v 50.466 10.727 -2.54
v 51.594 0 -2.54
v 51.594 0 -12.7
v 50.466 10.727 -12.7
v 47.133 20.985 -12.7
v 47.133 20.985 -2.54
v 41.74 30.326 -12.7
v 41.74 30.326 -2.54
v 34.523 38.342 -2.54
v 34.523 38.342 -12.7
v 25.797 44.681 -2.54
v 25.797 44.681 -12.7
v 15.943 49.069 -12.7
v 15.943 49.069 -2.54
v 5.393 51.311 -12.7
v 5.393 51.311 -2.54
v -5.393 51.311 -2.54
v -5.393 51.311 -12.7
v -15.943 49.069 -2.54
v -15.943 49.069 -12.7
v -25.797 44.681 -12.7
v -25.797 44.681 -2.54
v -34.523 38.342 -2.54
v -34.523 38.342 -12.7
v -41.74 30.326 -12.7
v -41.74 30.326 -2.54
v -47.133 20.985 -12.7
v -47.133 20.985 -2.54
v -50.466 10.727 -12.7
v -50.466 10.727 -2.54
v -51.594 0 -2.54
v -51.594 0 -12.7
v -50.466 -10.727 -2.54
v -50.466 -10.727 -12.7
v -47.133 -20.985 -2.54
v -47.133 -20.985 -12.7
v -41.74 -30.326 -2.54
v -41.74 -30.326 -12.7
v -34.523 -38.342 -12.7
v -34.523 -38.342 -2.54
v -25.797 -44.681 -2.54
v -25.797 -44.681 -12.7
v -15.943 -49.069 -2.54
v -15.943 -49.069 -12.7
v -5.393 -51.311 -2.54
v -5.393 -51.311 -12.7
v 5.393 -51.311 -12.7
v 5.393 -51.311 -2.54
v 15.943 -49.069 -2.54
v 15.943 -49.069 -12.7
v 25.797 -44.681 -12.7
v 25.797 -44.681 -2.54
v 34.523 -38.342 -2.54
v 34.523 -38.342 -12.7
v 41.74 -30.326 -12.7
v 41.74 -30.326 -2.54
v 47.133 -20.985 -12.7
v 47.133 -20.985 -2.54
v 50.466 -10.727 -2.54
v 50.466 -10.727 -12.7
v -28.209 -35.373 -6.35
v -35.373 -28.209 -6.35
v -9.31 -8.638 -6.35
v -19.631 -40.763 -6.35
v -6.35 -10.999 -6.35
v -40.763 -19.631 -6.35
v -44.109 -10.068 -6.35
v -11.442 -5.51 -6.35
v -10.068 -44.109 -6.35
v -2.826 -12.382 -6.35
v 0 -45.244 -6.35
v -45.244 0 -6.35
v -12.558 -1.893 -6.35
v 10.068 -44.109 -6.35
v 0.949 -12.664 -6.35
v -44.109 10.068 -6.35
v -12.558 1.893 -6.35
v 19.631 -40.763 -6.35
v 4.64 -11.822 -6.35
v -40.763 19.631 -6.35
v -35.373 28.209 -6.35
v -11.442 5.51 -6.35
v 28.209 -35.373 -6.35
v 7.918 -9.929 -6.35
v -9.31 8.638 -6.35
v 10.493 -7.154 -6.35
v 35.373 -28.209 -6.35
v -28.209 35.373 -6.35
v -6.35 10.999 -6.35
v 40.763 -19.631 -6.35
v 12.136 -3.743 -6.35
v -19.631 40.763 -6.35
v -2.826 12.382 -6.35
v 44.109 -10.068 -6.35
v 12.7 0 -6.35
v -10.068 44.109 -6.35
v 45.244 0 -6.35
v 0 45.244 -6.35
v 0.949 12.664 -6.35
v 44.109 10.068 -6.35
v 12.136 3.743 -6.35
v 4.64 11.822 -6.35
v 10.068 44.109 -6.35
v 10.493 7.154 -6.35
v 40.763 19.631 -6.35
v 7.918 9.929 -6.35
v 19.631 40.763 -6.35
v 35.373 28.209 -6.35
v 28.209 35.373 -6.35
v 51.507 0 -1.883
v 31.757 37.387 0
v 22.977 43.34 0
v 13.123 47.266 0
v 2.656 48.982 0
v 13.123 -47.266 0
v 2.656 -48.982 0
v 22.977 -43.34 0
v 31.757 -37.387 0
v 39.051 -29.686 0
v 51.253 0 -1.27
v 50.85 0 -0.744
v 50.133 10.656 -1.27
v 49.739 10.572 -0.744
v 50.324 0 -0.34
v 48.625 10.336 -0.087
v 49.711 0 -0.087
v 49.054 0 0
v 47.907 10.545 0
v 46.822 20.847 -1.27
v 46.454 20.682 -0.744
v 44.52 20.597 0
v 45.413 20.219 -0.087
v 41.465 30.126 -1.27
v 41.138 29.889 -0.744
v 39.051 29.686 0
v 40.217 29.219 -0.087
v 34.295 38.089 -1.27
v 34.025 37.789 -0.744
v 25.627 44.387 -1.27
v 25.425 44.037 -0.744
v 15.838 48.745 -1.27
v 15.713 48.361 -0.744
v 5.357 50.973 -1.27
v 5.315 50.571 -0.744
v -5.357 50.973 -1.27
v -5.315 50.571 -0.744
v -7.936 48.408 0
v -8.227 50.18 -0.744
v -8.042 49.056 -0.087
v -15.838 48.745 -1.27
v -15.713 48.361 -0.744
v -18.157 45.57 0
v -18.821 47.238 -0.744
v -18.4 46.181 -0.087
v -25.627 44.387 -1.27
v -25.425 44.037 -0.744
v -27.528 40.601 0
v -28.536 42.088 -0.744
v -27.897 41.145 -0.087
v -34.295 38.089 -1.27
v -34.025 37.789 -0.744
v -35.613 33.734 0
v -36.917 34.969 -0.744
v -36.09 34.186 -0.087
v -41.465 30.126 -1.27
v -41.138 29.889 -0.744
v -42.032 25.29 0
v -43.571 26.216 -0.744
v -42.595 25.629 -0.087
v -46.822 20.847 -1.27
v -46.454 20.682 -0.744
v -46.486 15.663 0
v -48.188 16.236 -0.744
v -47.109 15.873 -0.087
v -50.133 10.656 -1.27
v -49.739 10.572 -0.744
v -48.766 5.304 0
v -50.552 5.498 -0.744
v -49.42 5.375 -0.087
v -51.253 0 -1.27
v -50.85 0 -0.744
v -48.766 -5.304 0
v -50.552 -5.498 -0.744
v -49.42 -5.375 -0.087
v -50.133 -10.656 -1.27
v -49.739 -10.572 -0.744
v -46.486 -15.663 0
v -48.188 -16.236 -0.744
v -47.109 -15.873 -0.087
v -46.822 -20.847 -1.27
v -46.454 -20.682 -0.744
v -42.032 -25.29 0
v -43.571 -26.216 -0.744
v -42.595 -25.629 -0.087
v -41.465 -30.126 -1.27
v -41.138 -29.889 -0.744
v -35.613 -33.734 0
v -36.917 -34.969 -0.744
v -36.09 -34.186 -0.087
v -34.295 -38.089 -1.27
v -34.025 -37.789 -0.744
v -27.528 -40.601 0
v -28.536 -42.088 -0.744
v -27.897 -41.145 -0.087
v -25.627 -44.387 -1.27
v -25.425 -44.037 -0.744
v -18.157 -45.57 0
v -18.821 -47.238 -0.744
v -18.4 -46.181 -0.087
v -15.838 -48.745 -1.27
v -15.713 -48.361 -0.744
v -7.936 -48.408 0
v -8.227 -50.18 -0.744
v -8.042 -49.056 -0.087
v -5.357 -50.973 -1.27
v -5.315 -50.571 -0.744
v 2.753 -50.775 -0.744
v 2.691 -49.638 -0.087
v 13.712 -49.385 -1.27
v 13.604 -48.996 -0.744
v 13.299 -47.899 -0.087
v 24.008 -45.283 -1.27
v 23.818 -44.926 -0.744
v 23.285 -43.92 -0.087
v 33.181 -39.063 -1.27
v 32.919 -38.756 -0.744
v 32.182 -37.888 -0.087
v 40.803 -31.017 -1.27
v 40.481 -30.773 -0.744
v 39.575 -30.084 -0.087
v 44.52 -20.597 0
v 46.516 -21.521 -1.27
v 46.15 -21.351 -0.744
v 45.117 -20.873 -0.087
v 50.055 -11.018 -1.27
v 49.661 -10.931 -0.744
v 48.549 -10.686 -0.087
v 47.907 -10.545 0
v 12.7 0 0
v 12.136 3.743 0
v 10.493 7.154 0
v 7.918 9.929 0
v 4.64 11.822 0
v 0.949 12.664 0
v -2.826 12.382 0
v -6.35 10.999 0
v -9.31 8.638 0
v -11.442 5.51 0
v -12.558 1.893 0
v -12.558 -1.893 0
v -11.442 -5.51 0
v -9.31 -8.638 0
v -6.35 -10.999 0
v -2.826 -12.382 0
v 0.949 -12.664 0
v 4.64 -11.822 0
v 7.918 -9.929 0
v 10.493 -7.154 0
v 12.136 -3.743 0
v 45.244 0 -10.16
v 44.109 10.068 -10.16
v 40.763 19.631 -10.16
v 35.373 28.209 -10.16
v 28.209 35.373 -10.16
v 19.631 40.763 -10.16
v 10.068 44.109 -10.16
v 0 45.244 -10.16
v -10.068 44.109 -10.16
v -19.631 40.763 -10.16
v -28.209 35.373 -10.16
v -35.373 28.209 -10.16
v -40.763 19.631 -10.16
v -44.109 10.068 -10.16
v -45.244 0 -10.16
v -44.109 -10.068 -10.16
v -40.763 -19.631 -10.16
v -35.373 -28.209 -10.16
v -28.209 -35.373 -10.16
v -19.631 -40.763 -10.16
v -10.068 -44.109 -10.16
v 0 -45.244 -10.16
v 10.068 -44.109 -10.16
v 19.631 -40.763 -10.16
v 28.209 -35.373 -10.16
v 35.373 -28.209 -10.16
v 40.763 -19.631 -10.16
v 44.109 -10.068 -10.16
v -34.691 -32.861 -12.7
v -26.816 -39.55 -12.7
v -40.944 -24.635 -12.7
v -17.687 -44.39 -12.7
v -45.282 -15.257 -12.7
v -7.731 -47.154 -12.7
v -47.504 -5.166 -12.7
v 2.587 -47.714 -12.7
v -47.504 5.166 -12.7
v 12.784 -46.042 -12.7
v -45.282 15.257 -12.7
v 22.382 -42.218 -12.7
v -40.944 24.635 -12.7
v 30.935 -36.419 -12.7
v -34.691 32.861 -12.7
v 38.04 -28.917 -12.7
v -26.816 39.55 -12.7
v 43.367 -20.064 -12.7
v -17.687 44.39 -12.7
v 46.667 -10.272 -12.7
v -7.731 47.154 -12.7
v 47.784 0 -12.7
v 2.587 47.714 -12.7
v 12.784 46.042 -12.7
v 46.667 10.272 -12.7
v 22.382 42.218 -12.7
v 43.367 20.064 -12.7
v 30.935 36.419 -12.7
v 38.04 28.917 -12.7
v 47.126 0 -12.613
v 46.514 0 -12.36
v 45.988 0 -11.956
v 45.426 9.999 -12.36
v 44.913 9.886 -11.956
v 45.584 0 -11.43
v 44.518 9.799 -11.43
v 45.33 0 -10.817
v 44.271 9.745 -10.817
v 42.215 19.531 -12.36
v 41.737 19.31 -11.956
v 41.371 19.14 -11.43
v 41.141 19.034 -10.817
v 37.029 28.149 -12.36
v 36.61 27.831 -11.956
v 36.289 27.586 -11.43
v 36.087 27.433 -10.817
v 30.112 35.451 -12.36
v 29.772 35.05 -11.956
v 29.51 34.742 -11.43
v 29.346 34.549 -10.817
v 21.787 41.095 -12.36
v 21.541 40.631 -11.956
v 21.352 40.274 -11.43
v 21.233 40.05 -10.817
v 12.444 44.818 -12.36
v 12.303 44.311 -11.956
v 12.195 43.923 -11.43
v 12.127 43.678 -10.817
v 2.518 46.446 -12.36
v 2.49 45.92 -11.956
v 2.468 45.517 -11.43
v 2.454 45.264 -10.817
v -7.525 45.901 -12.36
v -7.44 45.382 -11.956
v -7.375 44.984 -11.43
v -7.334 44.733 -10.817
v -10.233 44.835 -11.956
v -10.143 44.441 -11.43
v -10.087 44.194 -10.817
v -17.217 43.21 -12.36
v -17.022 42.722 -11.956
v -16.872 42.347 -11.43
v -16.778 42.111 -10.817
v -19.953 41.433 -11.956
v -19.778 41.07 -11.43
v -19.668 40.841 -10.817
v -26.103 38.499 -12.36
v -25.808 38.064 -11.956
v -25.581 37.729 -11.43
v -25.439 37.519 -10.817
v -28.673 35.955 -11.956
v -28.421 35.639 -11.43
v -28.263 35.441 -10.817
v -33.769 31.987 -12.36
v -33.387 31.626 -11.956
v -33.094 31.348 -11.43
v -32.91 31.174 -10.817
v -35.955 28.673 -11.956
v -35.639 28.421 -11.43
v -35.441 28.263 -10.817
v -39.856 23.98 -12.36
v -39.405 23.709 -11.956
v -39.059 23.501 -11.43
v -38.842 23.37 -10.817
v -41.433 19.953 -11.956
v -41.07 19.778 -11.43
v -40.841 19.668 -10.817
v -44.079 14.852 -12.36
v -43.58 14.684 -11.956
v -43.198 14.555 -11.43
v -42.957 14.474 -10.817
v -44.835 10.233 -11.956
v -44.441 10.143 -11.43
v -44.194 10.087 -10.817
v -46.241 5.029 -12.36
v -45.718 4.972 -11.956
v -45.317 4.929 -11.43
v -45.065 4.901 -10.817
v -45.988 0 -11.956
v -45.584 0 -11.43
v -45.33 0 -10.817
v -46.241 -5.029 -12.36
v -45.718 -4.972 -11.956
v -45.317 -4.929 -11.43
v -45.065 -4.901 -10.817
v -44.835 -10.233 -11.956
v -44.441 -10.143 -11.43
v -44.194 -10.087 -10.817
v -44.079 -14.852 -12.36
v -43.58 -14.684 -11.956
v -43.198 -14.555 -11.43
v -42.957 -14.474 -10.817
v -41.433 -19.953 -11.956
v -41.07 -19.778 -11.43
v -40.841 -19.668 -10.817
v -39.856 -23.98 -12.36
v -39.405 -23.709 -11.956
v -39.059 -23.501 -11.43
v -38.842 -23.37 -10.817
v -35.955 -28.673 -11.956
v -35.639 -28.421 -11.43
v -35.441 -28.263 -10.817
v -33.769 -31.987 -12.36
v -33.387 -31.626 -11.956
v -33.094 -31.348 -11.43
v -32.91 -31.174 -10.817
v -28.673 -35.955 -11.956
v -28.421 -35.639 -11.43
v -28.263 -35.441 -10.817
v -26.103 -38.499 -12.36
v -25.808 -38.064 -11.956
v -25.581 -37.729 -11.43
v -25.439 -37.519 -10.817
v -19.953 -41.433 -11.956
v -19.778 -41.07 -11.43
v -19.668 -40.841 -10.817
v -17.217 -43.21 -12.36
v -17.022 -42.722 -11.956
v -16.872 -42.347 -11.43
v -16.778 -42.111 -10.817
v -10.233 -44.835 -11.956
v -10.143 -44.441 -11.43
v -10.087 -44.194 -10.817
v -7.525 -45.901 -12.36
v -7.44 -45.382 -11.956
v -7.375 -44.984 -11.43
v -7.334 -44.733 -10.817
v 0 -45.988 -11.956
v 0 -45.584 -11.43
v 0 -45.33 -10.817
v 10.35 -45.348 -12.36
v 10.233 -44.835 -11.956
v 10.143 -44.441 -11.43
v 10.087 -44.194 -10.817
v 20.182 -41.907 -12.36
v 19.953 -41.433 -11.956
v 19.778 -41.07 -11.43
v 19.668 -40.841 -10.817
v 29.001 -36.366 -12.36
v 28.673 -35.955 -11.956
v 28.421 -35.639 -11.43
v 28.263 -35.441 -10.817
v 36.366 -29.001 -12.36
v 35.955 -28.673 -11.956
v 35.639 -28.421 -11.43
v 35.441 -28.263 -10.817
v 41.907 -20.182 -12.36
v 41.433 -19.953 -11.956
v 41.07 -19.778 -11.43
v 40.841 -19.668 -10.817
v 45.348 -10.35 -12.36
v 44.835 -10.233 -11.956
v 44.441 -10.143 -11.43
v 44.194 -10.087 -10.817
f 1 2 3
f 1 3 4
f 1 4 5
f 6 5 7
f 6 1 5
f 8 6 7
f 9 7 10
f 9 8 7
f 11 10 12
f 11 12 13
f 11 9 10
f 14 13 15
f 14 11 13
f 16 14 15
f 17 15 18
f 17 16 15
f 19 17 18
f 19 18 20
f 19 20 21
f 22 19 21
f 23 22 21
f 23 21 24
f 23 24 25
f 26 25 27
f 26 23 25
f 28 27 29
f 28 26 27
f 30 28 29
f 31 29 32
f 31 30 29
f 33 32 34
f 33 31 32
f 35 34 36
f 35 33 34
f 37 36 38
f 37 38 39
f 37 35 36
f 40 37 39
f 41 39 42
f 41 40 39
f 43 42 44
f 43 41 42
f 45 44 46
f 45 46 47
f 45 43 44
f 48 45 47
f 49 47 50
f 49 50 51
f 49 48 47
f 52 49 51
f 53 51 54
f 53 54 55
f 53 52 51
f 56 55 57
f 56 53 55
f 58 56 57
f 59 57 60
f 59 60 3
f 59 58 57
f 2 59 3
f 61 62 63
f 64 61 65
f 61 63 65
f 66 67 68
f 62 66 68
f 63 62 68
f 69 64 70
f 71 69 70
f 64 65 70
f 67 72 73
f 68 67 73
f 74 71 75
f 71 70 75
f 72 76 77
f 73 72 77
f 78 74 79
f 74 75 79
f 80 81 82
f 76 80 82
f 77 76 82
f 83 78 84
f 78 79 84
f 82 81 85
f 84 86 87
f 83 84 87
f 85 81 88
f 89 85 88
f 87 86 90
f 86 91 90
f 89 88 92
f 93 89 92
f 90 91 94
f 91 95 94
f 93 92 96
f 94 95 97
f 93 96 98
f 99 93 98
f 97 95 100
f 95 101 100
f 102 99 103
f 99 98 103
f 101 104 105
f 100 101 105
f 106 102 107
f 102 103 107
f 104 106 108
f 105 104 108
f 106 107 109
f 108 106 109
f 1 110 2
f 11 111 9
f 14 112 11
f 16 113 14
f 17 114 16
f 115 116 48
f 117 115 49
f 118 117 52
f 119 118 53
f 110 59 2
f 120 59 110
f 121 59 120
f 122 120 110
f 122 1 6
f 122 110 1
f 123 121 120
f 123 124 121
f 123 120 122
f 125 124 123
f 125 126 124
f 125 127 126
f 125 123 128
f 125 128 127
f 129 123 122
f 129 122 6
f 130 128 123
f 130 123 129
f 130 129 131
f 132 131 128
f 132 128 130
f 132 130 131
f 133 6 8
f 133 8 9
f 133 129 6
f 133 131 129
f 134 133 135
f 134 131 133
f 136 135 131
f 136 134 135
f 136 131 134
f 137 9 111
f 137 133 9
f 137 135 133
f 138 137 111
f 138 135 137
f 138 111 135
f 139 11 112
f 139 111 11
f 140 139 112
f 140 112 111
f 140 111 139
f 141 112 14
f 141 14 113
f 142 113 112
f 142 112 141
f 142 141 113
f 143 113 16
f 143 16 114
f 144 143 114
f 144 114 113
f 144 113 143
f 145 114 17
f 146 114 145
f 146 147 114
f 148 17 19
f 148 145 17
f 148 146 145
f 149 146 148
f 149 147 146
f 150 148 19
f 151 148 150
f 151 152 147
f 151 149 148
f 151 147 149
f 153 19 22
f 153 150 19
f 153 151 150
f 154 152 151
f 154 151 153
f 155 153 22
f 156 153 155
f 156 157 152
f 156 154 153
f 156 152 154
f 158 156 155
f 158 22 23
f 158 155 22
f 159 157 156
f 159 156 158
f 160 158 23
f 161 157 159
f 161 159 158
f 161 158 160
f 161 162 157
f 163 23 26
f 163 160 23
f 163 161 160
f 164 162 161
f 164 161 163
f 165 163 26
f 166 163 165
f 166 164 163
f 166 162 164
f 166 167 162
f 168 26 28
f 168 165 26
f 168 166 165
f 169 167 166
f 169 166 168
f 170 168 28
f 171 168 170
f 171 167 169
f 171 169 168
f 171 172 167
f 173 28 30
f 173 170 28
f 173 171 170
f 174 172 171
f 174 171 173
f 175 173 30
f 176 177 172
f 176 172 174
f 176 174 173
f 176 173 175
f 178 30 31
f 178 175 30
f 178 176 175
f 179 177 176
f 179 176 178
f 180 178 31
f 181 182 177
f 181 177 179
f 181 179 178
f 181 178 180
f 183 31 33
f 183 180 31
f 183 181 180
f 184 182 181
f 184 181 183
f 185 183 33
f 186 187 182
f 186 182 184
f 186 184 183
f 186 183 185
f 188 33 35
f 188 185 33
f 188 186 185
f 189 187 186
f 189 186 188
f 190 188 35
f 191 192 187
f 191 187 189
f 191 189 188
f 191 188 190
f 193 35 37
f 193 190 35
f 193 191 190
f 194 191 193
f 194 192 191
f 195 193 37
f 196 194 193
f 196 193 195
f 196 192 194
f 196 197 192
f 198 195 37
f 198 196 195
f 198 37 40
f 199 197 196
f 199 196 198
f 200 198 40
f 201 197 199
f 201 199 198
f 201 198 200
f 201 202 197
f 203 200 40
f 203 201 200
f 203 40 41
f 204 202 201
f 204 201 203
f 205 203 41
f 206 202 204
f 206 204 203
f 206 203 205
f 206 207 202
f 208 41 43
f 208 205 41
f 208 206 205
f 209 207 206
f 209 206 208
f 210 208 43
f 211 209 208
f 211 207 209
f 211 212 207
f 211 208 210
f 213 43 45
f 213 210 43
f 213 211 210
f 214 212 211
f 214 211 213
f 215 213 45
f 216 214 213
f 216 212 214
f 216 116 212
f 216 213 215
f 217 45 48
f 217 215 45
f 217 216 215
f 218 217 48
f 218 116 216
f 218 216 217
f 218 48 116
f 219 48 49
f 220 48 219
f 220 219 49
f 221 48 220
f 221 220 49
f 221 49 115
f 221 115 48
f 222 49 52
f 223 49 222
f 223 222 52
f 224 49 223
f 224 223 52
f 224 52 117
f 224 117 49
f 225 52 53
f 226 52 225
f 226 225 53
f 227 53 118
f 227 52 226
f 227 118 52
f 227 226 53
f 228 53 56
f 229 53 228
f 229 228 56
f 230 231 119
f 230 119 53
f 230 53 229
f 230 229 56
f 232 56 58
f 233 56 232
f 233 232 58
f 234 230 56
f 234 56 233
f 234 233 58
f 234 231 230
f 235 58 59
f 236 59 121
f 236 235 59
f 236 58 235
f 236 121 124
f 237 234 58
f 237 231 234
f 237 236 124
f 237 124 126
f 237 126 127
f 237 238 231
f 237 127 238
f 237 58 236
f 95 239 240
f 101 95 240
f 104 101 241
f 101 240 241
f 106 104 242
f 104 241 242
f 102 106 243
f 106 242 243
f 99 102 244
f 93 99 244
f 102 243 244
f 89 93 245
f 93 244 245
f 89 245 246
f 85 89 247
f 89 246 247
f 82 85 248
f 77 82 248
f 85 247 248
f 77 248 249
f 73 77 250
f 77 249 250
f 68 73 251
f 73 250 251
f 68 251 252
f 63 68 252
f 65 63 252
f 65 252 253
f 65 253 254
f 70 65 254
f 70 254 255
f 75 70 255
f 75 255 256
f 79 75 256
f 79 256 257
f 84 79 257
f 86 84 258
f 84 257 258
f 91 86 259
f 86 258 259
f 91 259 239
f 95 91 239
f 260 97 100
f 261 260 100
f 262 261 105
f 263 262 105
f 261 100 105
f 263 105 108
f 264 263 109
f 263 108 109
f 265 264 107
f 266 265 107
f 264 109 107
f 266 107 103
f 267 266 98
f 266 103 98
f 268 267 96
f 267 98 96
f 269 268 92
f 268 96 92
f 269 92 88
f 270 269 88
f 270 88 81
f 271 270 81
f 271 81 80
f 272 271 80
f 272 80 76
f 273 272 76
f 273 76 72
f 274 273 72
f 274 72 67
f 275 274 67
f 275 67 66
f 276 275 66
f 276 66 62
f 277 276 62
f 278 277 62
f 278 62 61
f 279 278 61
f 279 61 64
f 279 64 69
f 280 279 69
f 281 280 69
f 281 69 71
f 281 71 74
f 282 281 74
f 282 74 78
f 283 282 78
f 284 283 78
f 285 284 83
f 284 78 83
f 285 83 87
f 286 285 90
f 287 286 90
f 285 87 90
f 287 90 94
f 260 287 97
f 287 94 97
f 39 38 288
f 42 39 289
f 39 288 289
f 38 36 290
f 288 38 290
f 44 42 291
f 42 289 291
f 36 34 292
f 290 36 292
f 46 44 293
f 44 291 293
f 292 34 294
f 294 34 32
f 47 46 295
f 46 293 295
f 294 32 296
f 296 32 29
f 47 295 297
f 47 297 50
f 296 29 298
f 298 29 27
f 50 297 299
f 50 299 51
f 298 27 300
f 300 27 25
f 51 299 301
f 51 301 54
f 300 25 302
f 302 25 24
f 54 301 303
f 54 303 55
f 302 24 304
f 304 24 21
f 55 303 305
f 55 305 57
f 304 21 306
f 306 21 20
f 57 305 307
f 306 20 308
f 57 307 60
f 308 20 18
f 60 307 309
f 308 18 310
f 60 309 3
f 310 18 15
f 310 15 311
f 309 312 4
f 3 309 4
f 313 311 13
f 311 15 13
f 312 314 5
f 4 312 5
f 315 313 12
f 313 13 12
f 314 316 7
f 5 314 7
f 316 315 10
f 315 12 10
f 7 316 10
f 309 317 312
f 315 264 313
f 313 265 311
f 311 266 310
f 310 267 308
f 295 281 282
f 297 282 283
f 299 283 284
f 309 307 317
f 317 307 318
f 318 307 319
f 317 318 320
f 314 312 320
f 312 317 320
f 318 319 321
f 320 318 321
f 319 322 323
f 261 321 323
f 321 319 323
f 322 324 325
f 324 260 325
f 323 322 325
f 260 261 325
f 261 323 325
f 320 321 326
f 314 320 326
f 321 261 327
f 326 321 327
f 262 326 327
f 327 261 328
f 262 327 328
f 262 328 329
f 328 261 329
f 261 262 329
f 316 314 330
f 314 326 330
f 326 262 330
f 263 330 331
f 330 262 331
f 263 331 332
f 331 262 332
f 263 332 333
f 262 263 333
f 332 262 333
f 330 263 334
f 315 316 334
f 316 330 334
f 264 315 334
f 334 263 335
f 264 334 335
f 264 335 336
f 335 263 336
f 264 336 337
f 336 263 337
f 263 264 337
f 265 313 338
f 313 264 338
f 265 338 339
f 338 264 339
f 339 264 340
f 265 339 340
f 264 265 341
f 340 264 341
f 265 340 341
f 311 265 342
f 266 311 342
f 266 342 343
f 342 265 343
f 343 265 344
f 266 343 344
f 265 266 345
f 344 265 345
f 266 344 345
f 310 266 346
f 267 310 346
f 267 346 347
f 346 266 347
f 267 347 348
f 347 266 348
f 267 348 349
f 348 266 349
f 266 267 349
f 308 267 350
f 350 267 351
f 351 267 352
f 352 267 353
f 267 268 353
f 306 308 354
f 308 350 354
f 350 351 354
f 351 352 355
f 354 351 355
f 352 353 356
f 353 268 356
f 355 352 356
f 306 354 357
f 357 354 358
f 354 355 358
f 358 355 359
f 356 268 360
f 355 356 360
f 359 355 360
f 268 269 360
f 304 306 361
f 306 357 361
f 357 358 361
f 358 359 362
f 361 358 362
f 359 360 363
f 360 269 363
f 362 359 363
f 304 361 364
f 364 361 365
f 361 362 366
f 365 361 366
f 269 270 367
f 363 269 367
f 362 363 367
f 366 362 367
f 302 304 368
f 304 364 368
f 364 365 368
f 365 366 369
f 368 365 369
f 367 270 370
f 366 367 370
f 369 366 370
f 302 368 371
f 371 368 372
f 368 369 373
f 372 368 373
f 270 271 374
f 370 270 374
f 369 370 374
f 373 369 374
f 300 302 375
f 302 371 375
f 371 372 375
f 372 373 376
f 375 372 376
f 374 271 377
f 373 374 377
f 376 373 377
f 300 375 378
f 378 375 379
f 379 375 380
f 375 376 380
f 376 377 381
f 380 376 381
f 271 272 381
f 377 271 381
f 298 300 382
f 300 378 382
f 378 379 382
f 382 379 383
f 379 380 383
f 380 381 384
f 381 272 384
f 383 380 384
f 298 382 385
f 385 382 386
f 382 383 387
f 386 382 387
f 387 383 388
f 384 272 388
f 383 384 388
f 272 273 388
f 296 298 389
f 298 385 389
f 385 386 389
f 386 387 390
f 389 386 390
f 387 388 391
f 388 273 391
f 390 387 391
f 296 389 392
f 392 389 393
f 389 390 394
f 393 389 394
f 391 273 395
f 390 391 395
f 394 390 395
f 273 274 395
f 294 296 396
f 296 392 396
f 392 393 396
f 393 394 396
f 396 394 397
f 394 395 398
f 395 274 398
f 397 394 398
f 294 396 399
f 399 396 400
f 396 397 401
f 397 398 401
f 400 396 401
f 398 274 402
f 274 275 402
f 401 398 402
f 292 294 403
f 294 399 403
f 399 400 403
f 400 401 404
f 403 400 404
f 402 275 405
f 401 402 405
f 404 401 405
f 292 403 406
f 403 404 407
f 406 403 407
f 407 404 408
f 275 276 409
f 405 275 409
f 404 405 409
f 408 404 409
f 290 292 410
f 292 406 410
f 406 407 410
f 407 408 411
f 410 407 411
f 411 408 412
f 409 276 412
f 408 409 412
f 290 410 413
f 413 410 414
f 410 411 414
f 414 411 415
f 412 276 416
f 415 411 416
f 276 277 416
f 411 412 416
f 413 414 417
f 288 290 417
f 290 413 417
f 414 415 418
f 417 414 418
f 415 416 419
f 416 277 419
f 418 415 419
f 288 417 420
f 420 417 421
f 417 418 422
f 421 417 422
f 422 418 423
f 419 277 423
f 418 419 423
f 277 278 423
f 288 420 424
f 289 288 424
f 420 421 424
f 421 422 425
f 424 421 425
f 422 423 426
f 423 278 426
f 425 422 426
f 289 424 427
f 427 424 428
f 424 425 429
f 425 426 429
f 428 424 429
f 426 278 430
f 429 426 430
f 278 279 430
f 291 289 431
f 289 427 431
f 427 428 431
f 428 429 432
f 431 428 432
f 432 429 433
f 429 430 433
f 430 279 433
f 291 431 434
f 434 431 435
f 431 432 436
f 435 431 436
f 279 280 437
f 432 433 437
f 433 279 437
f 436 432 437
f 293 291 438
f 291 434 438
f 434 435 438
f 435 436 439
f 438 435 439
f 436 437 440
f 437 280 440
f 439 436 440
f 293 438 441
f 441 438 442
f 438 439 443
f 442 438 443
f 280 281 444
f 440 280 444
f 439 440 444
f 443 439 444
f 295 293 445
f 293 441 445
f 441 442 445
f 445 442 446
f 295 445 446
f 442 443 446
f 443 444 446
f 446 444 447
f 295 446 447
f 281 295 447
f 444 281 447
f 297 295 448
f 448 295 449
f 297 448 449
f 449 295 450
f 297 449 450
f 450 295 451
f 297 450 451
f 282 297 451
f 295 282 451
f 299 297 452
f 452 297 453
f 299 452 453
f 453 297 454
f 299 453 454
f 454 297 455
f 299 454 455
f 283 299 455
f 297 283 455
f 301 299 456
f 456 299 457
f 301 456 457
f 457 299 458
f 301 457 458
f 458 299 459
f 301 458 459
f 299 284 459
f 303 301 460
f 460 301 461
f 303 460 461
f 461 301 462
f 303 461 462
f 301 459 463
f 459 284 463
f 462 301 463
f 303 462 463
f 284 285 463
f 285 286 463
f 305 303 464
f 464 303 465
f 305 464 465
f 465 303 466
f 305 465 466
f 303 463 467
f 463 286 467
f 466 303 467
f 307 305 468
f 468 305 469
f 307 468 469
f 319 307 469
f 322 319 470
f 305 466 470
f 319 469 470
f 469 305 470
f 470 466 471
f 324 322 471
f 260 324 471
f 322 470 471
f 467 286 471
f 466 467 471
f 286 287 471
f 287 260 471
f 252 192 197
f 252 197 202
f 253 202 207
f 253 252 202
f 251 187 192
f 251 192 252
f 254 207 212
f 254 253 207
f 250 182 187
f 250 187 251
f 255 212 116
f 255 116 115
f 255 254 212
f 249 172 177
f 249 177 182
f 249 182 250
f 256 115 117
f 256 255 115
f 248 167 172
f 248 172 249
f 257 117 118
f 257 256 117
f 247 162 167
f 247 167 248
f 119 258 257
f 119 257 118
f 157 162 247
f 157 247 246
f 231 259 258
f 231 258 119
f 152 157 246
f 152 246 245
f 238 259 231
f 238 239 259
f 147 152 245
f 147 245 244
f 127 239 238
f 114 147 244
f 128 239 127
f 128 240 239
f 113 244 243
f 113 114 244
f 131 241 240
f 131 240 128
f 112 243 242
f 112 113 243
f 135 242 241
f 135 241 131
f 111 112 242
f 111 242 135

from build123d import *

# Parameters (mm, degrees)
F0_R     = 45.24375
F0_R_2   = 12.7
F1_DEPTH = 6.35
F0_R_3   = 51.59375
F2_DEPTH = 12.7
F3_R     = 2.54
F4_R     = 2.54


with BuildPart() as f1:
    # F0 (on Top) → F1 (new body)
    with BuildSketch(Plane.XY):
        Circle(F0_R)
        Circle(F0_R_2, mode=Mode.SUBTRACT)
    extrude(amount=-F1_DEPTH)

    # F0 (on Top) → F2 (join)
    with BuildSketch(Plane.XY):
        Circle(F0_R_3)
        Circle(F0_R, mode=Mode.SUBTRACT)
    extrude(amount=-F2_DEPTH)

    # F3
    f3_edges = [f1.edges().sort_by_distance(p)[0] for p in [
        (-51.59375, 0, 0),
    ]]
    fillet(f3_edges, radius=F3_R)

    # F4
    f4_edges = [f1.edges().sort_by_distance(p)[0] for p in [
        (-45.24375, 0, -12.7),
    ]]
    fillet(f4_edges, radius=F4_R)


solid = f1.part
